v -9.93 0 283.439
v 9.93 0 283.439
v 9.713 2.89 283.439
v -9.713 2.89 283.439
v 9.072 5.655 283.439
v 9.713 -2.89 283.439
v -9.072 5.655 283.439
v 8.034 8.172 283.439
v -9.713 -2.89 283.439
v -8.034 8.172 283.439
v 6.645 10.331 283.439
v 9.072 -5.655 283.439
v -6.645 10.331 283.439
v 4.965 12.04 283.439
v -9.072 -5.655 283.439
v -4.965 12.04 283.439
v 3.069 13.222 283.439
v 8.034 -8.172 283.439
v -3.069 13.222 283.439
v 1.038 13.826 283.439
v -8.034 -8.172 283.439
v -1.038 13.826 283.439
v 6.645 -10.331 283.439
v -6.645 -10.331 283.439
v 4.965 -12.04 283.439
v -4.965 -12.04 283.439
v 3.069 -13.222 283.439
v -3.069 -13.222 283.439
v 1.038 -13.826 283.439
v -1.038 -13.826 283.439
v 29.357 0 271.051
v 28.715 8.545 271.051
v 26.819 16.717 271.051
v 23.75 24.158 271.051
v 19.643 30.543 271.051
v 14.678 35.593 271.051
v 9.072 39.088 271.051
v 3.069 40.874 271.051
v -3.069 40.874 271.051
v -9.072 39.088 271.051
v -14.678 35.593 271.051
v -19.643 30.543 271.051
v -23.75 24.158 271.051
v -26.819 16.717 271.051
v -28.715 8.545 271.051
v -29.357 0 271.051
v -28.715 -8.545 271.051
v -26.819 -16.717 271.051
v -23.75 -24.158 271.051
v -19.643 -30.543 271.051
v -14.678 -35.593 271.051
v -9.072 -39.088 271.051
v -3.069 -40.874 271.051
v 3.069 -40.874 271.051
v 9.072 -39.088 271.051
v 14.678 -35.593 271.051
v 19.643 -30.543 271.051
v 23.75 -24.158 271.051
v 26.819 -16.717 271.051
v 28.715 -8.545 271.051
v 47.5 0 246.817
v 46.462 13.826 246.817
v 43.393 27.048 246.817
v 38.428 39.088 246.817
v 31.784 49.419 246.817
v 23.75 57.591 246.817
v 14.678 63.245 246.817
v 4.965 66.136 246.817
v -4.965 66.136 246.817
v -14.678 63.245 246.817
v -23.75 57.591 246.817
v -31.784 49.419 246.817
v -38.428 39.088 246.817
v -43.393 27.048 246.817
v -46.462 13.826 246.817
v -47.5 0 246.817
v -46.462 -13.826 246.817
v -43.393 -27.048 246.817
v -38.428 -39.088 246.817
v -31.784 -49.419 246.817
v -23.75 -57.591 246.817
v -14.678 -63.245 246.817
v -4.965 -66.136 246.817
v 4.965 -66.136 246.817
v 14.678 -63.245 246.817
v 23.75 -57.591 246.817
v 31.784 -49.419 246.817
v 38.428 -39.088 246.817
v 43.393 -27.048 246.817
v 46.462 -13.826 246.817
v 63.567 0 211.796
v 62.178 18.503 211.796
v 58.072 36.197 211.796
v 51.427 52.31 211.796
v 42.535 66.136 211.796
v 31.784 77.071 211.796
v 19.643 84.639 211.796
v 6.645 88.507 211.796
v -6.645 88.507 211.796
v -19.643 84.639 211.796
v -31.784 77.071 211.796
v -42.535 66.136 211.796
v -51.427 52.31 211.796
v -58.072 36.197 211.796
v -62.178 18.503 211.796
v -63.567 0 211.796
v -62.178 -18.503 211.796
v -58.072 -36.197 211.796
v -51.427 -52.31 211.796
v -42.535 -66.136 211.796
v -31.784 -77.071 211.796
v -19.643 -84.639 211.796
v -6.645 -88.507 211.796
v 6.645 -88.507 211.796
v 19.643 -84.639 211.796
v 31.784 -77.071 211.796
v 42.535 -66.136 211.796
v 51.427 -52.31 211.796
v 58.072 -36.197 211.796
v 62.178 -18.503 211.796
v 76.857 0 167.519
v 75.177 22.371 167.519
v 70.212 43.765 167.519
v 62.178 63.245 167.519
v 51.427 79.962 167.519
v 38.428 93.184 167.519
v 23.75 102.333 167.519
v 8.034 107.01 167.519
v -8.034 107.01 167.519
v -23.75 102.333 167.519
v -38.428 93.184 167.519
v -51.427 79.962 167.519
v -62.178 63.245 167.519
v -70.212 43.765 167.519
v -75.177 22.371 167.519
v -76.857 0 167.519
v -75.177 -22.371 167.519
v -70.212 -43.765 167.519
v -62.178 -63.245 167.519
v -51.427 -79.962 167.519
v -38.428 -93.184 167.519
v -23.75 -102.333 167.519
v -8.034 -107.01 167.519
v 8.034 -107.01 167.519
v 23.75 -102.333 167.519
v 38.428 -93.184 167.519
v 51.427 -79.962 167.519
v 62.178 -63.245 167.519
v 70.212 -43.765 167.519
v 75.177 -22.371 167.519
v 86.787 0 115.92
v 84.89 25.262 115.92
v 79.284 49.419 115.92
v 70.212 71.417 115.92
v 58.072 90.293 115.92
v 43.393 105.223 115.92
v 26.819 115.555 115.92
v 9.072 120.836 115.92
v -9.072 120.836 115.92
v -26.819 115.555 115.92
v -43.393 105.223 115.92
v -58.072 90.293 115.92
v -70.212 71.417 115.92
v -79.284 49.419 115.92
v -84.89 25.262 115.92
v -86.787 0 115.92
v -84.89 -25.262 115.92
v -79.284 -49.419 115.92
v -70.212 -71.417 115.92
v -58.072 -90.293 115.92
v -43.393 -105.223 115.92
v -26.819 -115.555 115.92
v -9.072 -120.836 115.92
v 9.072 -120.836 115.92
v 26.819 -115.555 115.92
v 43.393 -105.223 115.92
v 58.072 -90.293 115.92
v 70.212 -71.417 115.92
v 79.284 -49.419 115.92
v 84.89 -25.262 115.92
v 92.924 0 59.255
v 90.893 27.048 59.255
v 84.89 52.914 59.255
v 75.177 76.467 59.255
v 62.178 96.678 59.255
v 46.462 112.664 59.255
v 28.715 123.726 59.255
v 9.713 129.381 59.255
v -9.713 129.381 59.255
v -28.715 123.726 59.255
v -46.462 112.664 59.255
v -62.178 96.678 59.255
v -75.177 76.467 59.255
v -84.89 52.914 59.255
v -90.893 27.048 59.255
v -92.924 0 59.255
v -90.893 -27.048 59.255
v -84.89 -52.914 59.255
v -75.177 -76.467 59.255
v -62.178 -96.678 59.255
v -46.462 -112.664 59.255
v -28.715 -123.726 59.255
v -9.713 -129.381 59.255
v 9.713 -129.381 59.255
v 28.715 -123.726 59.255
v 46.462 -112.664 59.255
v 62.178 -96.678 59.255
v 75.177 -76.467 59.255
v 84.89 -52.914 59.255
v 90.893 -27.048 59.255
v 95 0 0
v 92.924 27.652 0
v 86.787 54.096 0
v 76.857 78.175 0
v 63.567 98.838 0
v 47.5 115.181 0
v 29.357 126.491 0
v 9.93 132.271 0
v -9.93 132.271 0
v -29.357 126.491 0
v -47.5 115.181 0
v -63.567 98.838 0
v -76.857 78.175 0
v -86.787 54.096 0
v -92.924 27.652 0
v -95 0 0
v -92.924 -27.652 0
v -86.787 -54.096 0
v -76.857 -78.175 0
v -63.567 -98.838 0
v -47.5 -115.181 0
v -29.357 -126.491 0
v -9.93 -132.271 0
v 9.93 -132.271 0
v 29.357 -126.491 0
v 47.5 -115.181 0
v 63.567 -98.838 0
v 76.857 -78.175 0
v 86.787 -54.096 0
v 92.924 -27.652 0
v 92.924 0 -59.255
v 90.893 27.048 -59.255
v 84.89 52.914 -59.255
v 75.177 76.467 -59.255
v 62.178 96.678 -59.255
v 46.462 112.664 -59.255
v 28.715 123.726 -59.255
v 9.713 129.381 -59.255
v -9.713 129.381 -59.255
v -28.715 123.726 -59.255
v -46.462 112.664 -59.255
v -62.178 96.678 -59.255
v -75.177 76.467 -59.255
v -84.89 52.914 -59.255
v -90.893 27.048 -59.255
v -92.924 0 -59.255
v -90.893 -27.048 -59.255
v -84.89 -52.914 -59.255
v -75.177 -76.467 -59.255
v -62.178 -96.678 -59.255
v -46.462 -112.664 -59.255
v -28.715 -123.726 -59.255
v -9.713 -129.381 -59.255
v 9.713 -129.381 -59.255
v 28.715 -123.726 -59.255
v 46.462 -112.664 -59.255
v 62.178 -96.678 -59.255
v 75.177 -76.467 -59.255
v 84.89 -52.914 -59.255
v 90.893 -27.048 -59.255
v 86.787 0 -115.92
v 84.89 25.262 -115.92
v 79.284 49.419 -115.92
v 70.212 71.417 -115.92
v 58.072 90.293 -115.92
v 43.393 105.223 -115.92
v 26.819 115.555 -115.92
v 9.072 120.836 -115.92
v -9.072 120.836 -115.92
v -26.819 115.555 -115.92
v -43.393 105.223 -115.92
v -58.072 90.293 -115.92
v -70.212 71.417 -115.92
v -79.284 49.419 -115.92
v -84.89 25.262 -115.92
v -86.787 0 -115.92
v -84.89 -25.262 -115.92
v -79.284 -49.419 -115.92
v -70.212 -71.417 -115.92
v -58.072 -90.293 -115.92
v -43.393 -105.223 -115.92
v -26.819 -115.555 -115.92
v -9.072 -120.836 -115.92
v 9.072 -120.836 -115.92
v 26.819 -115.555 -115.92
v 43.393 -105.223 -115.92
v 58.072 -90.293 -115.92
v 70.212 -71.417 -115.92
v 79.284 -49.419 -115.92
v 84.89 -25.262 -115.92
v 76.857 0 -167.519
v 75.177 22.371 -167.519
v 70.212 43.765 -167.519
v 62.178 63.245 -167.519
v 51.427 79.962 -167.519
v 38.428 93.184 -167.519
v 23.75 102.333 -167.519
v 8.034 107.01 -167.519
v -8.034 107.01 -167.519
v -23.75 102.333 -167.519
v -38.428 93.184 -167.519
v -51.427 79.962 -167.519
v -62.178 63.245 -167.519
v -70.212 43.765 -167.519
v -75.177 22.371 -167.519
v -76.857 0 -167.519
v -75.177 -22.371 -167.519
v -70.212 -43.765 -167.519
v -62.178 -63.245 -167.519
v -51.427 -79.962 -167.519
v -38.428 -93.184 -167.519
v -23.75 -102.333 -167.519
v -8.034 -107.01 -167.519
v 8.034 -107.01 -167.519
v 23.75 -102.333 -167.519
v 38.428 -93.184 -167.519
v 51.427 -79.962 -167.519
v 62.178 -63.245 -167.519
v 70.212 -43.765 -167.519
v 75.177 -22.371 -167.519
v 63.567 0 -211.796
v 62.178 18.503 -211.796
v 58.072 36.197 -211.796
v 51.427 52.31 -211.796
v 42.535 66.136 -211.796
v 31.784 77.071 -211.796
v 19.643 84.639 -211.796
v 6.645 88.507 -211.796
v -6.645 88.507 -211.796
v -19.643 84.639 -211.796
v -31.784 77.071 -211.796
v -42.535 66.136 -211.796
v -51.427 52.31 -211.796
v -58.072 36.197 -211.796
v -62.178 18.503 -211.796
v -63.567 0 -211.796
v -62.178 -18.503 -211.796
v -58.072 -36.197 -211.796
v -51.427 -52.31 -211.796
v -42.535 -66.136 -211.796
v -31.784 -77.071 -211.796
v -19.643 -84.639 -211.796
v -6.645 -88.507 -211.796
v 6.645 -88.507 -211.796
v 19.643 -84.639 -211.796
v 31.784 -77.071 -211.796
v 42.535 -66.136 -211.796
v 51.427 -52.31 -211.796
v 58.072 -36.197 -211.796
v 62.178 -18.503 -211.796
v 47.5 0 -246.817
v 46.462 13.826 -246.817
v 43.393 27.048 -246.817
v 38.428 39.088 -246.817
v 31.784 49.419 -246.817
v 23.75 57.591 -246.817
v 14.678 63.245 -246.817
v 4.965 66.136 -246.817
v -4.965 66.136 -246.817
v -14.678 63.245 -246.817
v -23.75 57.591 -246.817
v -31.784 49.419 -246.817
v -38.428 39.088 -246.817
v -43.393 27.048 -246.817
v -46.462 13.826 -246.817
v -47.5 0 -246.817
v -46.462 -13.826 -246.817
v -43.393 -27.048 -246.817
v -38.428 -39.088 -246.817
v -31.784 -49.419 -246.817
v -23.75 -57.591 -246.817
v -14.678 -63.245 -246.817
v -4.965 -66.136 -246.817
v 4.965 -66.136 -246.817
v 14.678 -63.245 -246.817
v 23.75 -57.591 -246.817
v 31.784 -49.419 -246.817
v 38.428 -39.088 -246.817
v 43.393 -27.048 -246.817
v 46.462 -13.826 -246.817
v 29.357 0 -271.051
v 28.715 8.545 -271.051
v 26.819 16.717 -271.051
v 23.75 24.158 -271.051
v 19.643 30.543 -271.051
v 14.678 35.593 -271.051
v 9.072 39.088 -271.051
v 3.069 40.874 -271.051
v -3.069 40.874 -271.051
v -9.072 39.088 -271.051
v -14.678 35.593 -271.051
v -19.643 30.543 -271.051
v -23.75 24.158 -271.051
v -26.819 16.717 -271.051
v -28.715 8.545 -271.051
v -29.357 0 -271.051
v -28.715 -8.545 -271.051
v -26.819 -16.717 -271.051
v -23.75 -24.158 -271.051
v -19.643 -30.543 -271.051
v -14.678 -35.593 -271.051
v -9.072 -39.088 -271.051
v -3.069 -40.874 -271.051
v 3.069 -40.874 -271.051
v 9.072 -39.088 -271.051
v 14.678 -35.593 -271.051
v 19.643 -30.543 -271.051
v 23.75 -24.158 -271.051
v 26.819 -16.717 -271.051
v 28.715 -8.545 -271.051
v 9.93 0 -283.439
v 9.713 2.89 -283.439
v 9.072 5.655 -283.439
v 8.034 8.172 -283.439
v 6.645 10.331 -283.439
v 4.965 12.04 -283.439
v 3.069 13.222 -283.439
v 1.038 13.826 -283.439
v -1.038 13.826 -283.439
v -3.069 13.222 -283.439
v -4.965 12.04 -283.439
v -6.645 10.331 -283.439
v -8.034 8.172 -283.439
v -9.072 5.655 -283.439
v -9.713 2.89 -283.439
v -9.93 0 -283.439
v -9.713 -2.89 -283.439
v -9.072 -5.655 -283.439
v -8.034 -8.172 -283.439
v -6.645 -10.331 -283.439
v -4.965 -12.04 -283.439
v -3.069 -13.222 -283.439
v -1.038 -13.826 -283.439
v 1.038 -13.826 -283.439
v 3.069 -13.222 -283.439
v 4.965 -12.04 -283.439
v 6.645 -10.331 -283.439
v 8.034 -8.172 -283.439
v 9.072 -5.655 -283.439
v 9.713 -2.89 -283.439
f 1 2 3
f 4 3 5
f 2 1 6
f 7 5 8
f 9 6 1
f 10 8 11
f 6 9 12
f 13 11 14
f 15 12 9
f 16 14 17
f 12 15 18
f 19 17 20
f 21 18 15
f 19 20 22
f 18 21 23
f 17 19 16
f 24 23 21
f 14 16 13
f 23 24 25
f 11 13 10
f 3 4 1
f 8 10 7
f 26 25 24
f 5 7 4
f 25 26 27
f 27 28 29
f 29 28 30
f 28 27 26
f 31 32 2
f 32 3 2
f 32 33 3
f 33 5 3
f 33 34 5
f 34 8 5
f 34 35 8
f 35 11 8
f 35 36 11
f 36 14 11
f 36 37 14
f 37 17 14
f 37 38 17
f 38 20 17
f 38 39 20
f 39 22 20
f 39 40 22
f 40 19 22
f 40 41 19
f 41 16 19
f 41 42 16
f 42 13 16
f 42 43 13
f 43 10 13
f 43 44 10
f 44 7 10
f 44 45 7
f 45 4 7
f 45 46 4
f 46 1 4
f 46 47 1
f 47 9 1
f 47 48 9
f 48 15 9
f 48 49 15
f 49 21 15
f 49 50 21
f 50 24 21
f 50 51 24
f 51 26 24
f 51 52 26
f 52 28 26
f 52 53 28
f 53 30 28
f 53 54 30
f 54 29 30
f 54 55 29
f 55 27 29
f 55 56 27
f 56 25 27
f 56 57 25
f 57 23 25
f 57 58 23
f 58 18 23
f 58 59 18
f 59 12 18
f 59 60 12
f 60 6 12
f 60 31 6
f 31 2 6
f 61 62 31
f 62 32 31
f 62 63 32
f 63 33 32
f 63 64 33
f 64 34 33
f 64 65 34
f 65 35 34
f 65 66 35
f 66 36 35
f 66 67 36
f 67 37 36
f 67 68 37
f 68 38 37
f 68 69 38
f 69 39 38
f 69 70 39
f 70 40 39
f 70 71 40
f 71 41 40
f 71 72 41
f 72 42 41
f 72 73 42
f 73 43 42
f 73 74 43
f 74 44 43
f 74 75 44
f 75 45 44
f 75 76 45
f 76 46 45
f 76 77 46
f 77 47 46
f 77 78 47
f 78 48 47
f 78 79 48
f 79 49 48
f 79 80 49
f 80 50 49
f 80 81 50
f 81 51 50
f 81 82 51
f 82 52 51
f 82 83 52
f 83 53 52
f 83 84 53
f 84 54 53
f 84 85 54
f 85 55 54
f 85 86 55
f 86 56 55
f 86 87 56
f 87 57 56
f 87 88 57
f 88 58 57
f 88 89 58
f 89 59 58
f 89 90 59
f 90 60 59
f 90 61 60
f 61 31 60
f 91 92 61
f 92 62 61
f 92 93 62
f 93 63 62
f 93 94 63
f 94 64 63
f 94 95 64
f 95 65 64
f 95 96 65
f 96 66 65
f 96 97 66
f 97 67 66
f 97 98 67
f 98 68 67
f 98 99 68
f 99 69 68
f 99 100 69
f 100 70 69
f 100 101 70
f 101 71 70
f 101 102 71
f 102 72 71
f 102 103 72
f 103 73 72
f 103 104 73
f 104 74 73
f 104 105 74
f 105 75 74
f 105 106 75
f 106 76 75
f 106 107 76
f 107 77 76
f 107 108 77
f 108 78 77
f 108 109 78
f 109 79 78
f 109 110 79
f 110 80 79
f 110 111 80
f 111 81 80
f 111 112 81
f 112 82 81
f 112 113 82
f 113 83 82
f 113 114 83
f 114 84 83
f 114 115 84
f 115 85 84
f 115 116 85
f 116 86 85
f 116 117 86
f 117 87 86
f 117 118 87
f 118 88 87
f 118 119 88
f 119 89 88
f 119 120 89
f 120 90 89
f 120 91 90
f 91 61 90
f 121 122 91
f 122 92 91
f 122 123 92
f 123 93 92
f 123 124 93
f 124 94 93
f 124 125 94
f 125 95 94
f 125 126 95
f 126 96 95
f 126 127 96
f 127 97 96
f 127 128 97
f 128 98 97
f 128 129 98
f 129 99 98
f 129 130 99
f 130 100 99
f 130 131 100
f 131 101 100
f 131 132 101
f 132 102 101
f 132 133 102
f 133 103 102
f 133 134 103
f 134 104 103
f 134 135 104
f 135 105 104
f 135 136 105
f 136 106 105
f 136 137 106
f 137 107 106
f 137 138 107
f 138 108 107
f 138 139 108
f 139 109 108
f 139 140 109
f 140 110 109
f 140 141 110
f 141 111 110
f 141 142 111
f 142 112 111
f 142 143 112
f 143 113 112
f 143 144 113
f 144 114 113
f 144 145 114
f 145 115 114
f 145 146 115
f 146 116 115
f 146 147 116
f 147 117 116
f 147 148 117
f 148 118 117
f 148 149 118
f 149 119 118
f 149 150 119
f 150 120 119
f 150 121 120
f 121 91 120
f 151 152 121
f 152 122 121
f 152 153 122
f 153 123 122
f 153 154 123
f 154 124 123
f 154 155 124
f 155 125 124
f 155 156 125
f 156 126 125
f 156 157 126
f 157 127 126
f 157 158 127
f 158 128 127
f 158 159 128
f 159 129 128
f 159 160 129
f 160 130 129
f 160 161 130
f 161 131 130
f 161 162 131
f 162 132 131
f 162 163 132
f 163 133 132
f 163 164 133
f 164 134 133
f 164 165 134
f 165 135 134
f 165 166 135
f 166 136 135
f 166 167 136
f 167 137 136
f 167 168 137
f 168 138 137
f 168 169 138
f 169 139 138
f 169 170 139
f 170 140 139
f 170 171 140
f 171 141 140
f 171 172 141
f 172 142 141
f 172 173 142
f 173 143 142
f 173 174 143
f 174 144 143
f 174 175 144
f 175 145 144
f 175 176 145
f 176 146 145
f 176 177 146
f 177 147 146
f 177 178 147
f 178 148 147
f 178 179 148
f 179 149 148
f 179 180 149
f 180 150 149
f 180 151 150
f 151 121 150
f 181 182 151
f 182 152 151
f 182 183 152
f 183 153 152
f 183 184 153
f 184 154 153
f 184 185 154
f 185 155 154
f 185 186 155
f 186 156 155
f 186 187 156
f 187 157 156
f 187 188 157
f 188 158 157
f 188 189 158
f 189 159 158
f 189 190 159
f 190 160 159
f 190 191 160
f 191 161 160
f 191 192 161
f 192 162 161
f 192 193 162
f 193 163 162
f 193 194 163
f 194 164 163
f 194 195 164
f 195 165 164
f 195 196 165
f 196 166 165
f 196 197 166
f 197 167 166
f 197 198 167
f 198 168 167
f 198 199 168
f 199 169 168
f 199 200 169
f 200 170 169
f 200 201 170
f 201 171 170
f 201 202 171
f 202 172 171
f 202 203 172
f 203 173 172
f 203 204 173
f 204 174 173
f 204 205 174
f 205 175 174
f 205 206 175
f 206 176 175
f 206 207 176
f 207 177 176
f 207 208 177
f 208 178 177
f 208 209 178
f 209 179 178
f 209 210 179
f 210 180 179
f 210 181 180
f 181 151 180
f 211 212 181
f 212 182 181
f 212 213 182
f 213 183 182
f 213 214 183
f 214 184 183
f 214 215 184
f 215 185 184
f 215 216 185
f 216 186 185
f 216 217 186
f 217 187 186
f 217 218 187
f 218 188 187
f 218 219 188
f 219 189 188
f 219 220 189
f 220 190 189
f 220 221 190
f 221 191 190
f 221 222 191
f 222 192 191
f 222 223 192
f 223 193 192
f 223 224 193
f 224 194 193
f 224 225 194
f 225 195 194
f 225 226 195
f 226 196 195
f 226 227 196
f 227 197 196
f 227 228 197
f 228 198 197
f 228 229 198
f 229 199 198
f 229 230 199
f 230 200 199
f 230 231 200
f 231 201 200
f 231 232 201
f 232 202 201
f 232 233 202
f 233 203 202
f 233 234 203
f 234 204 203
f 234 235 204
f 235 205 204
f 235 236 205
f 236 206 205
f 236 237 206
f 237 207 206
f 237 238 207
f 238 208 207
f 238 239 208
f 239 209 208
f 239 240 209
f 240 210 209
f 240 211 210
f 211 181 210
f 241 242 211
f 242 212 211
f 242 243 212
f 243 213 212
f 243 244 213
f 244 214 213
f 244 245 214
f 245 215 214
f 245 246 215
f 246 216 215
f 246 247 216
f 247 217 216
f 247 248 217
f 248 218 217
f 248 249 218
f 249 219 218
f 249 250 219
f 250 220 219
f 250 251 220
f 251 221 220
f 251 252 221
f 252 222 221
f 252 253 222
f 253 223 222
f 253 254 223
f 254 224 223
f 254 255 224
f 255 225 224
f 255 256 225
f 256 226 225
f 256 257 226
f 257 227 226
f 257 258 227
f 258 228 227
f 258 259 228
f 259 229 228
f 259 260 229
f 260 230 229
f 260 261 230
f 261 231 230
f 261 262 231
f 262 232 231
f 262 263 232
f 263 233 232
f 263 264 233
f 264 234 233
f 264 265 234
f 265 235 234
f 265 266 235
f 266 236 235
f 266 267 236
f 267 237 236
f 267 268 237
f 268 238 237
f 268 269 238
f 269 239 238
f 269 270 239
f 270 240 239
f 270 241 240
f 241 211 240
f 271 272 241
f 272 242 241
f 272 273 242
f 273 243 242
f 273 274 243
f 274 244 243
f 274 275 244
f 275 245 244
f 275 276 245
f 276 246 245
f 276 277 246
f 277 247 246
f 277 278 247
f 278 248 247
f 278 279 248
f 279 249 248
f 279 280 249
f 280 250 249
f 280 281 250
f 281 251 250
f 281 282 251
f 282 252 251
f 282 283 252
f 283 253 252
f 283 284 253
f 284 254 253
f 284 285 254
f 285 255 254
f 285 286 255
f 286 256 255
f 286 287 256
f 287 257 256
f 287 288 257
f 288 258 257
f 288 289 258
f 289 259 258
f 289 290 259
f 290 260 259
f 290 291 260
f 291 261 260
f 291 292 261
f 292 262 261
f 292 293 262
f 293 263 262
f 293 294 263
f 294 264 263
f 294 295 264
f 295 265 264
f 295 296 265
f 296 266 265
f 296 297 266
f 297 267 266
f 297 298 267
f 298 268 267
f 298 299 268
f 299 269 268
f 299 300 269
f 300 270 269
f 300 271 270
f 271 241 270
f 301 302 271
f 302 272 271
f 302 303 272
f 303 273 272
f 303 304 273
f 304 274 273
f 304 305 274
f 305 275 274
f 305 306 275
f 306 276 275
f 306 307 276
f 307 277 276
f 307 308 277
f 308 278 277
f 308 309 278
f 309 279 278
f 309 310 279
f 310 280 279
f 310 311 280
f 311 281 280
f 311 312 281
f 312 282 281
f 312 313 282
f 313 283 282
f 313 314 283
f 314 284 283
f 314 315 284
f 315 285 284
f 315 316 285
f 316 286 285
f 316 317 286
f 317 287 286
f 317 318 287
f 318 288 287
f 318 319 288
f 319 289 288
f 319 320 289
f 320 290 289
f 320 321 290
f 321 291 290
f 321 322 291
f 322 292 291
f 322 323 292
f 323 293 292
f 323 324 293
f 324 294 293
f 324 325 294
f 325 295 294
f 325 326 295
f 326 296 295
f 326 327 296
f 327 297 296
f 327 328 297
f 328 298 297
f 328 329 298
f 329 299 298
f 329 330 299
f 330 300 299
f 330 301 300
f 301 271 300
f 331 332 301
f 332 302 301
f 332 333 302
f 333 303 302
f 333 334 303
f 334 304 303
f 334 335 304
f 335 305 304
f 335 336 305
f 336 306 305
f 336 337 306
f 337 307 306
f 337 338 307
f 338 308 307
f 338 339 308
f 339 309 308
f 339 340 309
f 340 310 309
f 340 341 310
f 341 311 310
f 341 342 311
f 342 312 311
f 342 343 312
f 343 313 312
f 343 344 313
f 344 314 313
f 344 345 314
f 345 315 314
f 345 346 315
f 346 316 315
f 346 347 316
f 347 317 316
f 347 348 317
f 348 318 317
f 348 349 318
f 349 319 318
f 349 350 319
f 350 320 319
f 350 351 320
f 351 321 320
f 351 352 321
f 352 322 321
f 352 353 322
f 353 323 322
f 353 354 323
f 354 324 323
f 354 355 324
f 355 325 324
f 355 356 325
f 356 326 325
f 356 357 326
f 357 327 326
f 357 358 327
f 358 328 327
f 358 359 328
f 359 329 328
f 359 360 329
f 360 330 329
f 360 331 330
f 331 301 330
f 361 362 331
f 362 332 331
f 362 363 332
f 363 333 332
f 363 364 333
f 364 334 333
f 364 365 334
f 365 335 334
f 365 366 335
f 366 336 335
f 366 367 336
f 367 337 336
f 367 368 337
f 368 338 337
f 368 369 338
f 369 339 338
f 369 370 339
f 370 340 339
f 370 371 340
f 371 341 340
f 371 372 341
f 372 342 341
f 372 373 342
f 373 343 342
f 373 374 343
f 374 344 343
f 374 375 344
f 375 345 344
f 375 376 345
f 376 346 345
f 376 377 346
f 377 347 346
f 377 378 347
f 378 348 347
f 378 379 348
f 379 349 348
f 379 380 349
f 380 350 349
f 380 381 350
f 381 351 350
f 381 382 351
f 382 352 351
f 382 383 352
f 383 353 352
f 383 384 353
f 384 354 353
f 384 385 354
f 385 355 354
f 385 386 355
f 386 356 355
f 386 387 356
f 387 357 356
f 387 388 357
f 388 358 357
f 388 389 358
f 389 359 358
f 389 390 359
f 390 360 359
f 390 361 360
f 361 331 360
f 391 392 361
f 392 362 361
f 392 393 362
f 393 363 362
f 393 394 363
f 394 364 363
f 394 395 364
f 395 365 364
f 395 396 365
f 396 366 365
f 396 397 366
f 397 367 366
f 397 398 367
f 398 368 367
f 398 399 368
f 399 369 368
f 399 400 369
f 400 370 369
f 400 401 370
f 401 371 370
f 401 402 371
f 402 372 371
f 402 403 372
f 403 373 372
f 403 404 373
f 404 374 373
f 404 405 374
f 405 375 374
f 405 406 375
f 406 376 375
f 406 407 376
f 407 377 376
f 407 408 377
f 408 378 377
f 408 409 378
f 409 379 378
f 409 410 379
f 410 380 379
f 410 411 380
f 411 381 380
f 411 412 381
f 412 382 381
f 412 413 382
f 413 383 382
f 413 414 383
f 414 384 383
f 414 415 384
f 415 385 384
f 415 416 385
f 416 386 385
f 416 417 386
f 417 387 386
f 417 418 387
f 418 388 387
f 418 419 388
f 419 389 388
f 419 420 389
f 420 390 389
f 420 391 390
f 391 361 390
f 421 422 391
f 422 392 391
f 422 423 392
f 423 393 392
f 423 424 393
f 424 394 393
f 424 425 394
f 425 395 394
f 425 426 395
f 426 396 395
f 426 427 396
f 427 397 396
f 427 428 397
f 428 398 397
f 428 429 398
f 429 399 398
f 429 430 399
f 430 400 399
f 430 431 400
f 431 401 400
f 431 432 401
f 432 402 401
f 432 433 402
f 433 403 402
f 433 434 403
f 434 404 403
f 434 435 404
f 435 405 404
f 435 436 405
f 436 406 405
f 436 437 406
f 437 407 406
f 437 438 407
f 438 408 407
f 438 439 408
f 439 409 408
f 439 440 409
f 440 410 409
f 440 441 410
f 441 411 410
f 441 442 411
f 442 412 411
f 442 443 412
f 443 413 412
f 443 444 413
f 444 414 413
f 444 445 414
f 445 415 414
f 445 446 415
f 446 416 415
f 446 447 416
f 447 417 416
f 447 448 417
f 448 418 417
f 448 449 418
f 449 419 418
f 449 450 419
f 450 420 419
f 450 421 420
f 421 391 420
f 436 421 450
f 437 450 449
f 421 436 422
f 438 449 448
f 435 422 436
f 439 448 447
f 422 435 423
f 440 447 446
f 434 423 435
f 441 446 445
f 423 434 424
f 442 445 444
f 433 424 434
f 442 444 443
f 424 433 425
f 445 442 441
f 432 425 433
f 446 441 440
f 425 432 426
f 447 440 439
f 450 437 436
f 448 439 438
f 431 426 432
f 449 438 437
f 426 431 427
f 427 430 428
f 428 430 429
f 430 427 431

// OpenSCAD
// Generated by SolidPython 1.0.1 on 2020-07-29 00:39:26


scale(v = [5, 7, 15]) {
	sphere(r = 19);
}
/***********************************************
*********      SolidPython code:      **********
************************************************
 
# import packages: SolidPython
from solid import *
from solid.utils import *
from itertools import chain, combinations


class Resize:

    def __init__(self, scad_file):
        self.scad_file = scad_file
        #self.scad_file = import_scad(scad_file)
        # cone/cylinder param:
        self.r1 = 0
        self.r2 = 0
        self.h = 0
        # rectangular prism param:
        self.w = 0
        self.l = 0
        # ellipse param:
        self.r = 0

    # import OpenScad code (file name corresponds to shape)


    # classify shape + parameters
    def assign(self, param1, param2, param3):
        if self.scad_file == 'cone.scad':
            self.r1 = param1
            self.r2 = param2
            self.h = param3
        elif self.scad_file == 'cylinder.scad':
            self.r1 = param1
            self.r2 = param2
            self.h = param3
        elif self.scad_file == 'rectangularPrism.scad':
            self.h = param1
            self.l = param2
            self.w = param3
        else:
            self.r = param1
            self.h = param2

    # resize parameters
    def iterate(self):
        x = range(3, 20, 2)
        i = 1
        if self.scad_file == 'cone.scad':
            tempList = list(combinations(x, 2))
            for temp in tempList:
                param1 = temp[0]
                param2 = temp[1]
                filepath = 'produced_scad_files/' + 'cone' + str(param1) + '_' + str(param2) + '_' + '.scad'
                scad_render_to_file(cylinder(h=param1, r1=param2, r2=0), filepath)

        elif self.scad_file == 'cylinder.scad':
            tempList = list(combinations(x, 3))
            for temp in tempList:
                param1 = temp[0]
                param2 = temp[1]
                filepath = 'produced_scad_files/' + 'cylinder' + str(param1) + '_' + str(param2) + '_' + '.scad'
                scad_render_to_file(cylinder(h=param1, r1=param2, r2=param2), filepath)

        elif self.scad_file == 'rectangularPrism.scad':
            tempList = list(combinations(x, 3))
            for temp in tempList:
                param1 = temp[0]
                param2 = temp[1]
                param3 = temp[2]
                filepath = 'produced_scad_files/' + 'rectangularPrism' + str(param1) + '_' + str(param2) + '_' + str(
                    param3) + '.scad'
                scad_render_to_file(cube(size=(param1, param2, param3)), filepath)

        elif self.scad_file == 'ellipse.scad':
            tempList = list(combinations(x, 4))
            for temp in tempList:
                param1 = temp[0]
                param2 = temp[1]
                param3 = temp[2]
                param4 = temp[3]
                filepath = 'produced_scad_files/' + 'ellipse' + str(param1) + '_' + str(param2) + '_' + str(param3) + '_' + str(param4) + '.scad'
                scad_render_to_file(scale([param1, param2, param3])(sphere(r=param4)), filepath)

    def render_to_scadfile(self):
        scad_render_to_file(scad, 'example.scad') 
 
************************************************/
